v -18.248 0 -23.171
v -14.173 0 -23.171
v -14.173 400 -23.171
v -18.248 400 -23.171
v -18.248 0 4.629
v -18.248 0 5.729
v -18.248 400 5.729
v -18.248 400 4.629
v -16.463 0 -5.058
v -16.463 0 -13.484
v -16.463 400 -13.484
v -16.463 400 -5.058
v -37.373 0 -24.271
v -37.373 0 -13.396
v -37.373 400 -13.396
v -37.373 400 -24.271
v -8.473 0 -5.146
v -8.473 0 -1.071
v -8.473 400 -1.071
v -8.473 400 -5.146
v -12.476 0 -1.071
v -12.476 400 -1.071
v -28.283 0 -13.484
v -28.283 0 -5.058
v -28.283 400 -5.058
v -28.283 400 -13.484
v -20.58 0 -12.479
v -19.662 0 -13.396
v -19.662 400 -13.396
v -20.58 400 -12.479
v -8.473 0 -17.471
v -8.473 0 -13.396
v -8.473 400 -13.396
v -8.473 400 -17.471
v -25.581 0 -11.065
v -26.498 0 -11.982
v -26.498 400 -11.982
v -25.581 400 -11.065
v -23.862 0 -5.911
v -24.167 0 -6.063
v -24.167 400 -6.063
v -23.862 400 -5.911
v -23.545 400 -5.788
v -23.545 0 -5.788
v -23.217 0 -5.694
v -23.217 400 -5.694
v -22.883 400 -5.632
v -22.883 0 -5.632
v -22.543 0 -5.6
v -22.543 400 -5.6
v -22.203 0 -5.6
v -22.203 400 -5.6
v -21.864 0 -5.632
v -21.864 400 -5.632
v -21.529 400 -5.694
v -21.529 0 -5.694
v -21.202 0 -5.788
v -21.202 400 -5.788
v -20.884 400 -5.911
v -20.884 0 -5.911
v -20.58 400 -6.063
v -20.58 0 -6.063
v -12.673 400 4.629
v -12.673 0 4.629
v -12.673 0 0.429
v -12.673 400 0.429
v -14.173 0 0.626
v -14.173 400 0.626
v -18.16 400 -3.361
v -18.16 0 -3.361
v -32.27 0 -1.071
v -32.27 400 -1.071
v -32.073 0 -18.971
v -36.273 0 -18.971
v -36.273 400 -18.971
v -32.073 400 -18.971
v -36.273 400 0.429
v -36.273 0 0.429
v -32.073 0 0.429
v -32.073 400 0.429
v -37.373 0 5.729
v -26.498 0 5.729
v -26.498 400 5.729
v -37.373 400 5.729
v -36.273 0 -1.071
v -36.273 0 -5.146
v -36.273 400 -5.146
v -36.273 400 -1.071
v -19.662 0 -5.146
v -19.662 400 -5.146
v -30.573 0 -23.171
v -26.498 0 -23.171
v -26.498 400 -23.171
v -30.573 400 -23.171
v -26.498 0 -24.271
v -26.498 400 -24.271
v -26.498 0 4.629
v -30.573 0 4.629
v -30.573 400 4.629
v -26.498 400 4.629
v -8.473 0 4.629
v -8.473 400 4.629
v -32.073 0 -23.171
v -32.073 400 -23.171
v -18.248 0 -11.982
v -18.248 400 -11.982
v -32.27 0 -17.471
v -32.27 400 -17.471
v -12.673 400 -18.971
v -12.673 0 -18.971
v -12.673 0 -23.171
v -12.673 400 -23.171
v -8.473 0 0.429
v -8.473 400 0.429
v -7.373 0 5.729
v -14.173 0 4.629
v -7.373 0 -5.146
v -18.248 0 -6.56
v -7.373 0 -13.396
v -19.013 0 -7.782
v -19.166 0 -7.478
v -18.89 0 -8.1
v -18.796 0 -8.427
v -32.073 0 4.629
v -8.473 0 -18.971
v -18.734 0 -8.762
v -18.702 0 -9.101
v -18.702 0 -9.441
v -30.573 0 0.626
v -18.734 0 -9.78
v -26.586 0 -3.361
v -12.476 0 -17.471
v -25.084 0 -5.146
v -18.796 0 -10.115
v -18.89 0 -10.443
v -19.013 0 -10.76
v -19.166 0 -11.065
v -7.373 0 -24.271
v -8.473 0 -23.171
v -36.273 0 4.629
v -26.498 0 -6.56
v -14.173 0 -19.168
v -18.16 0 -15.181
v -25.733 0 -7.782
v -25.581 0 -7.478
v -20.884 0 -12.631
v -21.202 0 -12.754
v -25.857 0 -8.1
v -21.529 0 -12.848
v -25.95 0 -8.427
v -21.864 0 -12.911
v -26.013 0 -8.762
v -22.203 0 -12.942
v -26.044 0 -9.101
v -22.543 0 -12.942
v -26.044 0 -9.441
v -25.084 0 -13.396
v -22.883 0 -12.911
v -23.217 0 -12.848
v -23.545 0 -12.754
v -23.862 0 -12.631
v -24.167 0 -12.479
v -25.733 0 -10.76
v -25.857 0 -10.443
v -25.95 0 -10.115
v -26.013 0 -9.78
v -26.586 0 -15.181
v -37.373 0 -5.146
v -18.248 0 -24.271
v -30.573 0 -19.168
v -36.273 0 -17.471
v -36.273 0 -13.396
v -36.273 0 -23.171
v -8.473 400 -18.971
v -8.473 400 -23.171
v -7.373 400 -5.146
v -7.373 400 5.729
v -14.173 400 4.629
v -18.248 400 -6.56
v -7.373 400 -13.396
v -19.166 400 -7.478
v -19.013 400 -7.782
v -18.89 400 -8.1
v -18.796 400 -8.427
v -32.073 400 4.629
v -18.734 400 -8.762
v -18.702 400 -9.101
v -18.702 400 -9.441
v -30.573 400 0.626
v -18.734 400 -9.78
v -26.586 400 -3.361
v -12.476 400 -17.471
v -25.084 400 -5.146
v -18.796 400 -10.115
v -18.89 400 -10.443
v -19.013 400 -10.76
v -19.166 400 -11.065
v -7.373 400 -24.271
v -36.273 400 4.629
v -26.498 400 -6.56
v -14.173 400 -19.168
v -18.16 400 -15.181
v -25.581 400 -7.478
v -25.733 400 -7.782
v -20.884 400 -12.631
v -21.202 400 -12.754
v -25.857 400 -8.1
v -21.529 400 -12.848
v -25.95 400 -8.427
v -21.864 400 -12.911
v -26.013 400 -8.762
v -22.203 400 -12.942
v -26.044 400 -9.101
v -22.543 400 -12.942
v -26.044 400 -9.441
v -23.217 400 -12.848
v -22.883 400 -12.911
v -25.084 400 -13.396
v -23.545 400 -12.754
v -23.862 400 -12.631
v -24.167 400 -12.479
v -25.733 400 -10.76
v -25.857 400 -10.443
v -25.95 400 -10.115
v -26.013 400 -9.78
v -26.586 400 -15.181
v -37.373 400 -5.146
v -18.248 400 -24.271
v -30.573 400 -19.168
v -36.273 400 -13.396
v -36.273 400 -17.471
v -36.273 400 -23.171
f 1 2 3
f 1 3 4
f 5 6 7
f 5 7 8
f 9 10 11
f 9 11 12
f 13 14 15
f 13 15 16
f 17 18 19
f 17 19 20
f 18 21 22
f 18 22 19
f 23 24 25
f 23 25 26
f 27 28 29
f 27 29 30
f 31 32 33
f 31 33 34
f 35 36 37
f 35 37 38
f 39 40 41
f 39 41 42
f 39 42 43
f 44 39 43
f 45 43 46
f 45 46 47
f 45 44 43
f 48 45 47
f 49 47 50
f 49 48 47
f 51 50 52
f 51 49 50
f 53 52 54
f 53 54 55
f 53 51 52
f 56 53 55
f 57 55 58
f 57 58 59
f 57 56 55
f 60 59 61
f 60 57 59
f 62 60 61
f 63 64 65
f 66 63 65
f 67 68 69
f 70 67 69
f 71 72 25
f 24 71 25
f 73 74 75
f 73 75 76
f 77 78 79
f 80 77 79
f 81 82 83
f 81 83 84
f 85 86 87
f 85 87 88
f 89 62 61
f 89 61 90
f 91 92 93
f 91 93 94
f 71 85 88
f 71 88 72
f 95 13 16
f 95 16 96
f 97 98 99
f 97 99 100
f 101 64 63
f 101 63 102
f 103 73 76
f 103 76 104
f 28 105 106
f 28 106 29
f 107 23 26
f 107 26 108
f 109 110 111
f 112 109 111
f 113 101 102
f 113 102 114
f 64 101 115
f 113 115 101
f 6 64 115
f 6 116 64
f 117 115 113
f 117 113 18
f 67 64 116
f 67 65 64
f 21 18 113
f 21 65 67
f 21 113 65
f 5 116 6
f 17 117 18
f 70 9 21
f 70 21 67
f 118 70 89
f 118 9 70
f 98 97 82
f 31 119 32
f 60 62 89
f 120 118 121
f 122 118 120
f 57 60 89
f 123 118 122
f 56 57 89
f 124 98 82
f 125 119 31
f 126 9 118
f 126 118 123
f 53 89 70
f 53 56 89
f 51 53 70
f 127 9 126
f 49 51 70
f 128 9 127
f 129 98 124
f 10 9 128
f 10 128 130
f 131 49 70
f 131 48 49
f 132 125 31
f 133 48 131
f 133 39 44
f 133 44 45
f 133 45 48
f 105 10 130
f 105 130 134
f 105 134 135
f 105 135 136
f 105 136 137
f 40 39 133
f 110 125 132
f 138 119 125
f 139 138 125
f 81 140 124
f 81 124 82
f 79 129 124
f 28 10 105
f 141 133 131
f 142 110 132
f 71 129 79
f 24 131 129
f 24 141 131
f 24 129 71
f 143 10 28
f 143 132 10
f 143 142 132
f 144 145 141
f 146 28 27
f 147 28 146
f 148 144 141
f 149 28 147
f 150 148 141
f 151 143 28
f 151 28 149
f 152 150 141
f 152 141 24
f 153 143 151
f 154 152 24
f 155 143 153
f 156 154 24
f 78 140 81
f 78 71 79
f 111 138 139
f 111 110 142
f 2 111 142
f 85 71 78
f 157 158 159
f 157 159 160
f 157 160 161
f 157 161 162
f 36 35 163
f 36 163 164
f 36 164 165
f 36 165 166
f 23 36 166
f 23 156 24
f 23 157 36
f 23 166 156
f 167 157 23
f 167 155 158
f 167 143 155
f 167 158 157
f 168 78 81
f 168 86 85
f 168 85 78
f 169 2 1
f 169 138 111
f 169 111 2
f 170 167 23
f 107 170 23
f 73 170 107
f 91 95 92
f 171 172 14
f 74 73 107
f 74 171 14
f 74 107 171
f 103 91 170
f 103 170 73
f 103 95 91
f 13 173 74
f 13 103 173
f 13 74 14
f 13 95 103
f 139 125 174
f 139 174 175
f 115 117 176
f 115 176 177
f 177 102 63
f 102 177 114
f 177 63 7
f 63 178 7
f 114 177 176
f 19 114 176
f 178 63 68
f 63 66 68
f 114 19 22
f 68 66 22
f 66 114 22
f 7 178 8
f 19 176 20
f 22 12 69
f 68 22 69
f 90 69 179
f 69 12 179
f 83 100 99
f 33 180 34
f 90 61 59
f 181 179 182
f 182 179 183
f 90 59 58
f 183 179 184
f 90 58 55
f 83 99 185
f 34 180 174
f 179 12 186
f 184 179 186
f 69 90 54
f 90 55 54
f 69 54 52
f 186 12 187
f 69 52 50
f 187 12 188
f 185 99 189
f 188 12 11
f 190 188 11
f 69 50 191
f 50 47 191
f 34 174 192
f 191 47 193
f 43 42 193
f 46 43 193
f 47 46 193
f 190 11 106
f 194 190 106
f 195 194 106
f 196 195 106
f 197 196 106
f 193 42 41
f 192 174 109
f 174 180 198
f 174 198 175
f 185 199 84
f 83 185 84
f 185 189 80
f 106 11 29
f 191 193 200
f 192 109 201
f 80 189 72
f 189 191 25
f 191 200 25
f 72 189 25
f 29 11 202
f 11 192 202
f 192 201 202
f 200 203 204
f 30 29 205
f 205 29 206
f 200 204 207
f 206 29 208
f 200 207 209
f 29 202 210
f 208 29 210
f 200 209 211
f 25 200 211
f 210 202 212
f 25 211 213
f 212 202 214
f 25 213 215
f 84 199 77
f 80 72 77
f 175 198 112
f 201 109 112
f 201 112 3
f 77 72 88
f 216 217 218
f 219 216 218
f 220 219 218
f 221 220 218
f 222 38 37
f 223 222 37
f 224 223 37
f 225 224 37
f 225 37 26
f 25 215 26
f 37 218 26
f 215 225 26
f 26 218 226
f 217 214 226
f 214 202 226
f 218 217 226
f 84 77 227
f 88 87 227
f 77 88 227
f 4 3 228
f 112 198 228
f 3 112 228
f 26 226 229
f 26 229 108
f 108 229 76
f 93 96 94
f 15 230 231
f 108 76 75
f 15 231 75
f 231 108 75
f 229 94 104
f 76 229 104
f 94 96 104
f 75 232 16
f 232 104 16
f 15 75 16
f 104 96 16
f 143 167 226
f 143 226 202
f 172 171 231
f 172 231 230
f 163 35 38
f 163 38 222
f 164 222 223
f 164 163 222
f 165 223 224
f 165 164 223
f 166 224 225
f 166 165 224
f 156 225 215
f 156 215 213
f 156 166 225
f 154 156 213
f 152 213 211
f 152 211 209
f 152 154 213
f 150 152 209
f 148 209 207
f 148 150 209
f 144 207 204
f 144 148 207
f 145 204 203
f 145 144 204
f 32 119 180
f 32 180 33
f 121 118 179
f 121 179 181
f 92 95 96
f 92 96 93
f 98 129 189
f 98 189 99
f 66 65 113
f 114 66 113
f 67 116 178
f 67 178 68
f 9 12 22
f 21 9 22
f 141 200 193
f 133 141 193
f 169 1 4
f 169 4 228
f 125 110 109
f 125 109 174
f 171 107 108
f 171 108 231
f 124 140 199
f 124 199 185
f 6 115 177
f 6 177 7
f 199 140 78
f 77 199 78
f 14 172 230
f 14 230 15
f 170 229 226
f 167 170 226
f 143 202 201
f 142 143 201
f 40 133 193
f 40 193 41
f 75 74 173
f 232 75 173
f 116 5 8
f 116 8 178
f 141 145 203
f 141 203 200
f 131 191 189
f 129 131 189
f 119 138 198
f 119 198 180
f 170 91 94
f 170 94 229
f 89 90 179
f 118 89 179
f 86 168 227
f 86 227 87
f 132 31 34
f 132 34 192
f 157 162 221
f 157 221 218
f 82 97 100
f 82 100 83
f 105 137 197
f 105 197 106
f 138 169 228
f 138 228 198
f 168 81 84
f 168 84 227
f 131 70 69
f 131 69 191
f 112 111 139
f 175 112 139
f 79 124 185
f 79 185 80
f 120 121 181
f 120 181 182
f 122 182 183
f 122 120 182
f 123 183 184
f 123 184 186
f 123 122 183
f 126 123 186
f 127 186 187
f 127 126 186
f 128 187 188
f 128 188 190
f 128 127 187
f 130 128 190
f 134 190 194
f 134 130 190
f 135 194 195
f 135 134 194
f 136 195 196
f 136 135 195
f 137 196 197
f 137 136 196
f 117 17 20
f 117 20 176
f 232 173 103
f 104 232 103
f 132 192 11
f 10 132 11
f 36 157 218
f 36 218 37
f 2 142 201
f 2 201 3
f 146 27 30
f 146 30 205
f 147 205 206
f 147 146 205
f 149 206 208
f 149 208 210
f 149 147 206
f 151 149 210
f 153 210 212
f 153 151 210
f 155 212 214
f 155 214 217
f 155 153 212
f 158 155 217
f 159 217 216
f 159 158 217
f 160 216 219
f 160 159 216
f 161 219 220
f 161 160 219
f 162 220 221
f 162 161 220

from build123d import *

# Parameters (mm, degrees)
CROQUIS2_W              = 4.2
CROQUIS2_H              = 4.2
SALIENTE_EXTRUIR1_DEPTH = 400


with BuildPart() as part:
    # Croquis2 → Saliente-Extruir1 (new body)
    with BuildSketch(Plane(origin=(0, 0, 0), x_dir=(1, 0, 0), z_dir=(0, 1, 0))):
        Polygon((-37.373217156, 24.271112291), (-26.498217156, 24.271112291), (-26.498217156, 23.171112291), (-30.573217156, 23.171112291), (-30.573217156, 19.168168566), (-26.586160881, 15.181112291), (-18.160273431, 15.181112291), (-14.173217156, 19.168168566), (-14.173217156, 23.171112291), (-18.248217156, 23.171112291), (-18.248217156, 24.271112291), (-7.373217156, 24.271112291), (-7.373217156, 13.396112291), (-8.473217156, 13.396112291), (-8.473217156, 17.471112291), (-12.476160881, 17.471112291), (-16.463217156, 13.484056016), (-16.463217156, 5.058168566), (-12.476160881, 1.071112291), (-8.473217156, 1.071112291), (-8.473217156, 5.146112291), (-7.373217156, 5.146112291), (-7.373217156, -5.728887709), (-18.248217156, -5.728887709), (-18.248217156, -4.628887709), (-14.173217156, -4.628887709), (-14.173217156, -0.625943984), (-18.160273431, 3.361112291), (-26.586160881, 3.361112291), (-30.573217156, -0.625943984), (-30.573217156, -4.628887709), (-26.498217156, -4.628887709), (-26.498217156, -5.728887709), (-37.373217156, -5.728887709), (-37.373217156, 5.146112291), (-36.273217156, 5.146112291), (-36.273217156, 1.071112291), (-32.270273431, 1.071112291), (-28.283217156, 5.058168566), (-28.283217156, 13.484056016), (-32.270273431, 17.471112291), (-36.273217156, 17.471112291), (-36.273217156, 13.396112291), (-37.373217156, 13.396112291), align=None)
        with Locations((-10.573217156, 21.071112291)):
            Rectangle(CROQUIS2_W, CROQUIS2_H, mode=Mode.SUBTRACT)
        with Locations((-34.173217156, -2.528887709)):
            Rectangle(CROQUIS2_W, CROQUIS2_H, mode=Mode.SUBTRACT)
        with Locations((-34.173217156, 21.071112291)):
            Rectangle(CROQUIS2_W, CROQUIS2_H, mode=Mode.SUBTRACT)
        with Locations((-10.573217156, -2.528887709)):
            Rectangle(CROQUIS2_W, CROQUIS2_H, mode=Mode.SUBTRACT)
        with BuildLine():
            Line((-19.165547938, 11.064567946), (-18.248217156, 11.981898728))
            Line((-18.248217156, 11.981898728), (-19.662430718, 13.396112291))
            Line((-19.662430718, 13.396112291), (-20.5797615, 12.478781509))
            ThreePointArc((-20.5797615, 12.478781509), (-22.373217156, 12.946112291), (-24.166672811, 12.478781509))
            Line((-24.166672811, 12.478781509), (-25.084003593, 13.396112291))
            Line((-25.084003593, 13.396112291), (-26.498217156, 11.981898728))
            Line((-26.498217156, 11.981898728), (-25.580886374, 11.064567946))
            ThreePointArc((-25.580886374, 11.064567946), (-26.048217156, 9.271112291), (-25.580886374, 7.477656635))
            Line((-25.580886374, 7.477656635), (-26.498217156, 6.560325853))
            Line((-26.498217156, 6.560325853), (-25.084003593, 5.146112291))
            Line((-25.084003593, 5.146112291), (-24.166672811, 6.063443073))
            ThreePointArc((-24.166672811, 6.063443073), (-22.373217156, 5.596112291), (-20.5797615, 6.063443073))
            Line((-20.5797615, 6.063443073), (-19.662430718, 5.146112291))
            Line((-19.662430718, 5.146112291), (-18.248217156, 6.560325853))
            Line((-18.248217156, 6.560325853), (-19.165547938, 7.477656635))
            ThreePointArc((-19.165547938, 7.477656635), (-18.698217156, 9.271112291), (-19.165547938, 11.064567946))
        make_face(mode=Mode.SUBTRACT)
    extrude(amount=SALIENTE_EXTRUIR1_DEPTH)


solid = part.part
